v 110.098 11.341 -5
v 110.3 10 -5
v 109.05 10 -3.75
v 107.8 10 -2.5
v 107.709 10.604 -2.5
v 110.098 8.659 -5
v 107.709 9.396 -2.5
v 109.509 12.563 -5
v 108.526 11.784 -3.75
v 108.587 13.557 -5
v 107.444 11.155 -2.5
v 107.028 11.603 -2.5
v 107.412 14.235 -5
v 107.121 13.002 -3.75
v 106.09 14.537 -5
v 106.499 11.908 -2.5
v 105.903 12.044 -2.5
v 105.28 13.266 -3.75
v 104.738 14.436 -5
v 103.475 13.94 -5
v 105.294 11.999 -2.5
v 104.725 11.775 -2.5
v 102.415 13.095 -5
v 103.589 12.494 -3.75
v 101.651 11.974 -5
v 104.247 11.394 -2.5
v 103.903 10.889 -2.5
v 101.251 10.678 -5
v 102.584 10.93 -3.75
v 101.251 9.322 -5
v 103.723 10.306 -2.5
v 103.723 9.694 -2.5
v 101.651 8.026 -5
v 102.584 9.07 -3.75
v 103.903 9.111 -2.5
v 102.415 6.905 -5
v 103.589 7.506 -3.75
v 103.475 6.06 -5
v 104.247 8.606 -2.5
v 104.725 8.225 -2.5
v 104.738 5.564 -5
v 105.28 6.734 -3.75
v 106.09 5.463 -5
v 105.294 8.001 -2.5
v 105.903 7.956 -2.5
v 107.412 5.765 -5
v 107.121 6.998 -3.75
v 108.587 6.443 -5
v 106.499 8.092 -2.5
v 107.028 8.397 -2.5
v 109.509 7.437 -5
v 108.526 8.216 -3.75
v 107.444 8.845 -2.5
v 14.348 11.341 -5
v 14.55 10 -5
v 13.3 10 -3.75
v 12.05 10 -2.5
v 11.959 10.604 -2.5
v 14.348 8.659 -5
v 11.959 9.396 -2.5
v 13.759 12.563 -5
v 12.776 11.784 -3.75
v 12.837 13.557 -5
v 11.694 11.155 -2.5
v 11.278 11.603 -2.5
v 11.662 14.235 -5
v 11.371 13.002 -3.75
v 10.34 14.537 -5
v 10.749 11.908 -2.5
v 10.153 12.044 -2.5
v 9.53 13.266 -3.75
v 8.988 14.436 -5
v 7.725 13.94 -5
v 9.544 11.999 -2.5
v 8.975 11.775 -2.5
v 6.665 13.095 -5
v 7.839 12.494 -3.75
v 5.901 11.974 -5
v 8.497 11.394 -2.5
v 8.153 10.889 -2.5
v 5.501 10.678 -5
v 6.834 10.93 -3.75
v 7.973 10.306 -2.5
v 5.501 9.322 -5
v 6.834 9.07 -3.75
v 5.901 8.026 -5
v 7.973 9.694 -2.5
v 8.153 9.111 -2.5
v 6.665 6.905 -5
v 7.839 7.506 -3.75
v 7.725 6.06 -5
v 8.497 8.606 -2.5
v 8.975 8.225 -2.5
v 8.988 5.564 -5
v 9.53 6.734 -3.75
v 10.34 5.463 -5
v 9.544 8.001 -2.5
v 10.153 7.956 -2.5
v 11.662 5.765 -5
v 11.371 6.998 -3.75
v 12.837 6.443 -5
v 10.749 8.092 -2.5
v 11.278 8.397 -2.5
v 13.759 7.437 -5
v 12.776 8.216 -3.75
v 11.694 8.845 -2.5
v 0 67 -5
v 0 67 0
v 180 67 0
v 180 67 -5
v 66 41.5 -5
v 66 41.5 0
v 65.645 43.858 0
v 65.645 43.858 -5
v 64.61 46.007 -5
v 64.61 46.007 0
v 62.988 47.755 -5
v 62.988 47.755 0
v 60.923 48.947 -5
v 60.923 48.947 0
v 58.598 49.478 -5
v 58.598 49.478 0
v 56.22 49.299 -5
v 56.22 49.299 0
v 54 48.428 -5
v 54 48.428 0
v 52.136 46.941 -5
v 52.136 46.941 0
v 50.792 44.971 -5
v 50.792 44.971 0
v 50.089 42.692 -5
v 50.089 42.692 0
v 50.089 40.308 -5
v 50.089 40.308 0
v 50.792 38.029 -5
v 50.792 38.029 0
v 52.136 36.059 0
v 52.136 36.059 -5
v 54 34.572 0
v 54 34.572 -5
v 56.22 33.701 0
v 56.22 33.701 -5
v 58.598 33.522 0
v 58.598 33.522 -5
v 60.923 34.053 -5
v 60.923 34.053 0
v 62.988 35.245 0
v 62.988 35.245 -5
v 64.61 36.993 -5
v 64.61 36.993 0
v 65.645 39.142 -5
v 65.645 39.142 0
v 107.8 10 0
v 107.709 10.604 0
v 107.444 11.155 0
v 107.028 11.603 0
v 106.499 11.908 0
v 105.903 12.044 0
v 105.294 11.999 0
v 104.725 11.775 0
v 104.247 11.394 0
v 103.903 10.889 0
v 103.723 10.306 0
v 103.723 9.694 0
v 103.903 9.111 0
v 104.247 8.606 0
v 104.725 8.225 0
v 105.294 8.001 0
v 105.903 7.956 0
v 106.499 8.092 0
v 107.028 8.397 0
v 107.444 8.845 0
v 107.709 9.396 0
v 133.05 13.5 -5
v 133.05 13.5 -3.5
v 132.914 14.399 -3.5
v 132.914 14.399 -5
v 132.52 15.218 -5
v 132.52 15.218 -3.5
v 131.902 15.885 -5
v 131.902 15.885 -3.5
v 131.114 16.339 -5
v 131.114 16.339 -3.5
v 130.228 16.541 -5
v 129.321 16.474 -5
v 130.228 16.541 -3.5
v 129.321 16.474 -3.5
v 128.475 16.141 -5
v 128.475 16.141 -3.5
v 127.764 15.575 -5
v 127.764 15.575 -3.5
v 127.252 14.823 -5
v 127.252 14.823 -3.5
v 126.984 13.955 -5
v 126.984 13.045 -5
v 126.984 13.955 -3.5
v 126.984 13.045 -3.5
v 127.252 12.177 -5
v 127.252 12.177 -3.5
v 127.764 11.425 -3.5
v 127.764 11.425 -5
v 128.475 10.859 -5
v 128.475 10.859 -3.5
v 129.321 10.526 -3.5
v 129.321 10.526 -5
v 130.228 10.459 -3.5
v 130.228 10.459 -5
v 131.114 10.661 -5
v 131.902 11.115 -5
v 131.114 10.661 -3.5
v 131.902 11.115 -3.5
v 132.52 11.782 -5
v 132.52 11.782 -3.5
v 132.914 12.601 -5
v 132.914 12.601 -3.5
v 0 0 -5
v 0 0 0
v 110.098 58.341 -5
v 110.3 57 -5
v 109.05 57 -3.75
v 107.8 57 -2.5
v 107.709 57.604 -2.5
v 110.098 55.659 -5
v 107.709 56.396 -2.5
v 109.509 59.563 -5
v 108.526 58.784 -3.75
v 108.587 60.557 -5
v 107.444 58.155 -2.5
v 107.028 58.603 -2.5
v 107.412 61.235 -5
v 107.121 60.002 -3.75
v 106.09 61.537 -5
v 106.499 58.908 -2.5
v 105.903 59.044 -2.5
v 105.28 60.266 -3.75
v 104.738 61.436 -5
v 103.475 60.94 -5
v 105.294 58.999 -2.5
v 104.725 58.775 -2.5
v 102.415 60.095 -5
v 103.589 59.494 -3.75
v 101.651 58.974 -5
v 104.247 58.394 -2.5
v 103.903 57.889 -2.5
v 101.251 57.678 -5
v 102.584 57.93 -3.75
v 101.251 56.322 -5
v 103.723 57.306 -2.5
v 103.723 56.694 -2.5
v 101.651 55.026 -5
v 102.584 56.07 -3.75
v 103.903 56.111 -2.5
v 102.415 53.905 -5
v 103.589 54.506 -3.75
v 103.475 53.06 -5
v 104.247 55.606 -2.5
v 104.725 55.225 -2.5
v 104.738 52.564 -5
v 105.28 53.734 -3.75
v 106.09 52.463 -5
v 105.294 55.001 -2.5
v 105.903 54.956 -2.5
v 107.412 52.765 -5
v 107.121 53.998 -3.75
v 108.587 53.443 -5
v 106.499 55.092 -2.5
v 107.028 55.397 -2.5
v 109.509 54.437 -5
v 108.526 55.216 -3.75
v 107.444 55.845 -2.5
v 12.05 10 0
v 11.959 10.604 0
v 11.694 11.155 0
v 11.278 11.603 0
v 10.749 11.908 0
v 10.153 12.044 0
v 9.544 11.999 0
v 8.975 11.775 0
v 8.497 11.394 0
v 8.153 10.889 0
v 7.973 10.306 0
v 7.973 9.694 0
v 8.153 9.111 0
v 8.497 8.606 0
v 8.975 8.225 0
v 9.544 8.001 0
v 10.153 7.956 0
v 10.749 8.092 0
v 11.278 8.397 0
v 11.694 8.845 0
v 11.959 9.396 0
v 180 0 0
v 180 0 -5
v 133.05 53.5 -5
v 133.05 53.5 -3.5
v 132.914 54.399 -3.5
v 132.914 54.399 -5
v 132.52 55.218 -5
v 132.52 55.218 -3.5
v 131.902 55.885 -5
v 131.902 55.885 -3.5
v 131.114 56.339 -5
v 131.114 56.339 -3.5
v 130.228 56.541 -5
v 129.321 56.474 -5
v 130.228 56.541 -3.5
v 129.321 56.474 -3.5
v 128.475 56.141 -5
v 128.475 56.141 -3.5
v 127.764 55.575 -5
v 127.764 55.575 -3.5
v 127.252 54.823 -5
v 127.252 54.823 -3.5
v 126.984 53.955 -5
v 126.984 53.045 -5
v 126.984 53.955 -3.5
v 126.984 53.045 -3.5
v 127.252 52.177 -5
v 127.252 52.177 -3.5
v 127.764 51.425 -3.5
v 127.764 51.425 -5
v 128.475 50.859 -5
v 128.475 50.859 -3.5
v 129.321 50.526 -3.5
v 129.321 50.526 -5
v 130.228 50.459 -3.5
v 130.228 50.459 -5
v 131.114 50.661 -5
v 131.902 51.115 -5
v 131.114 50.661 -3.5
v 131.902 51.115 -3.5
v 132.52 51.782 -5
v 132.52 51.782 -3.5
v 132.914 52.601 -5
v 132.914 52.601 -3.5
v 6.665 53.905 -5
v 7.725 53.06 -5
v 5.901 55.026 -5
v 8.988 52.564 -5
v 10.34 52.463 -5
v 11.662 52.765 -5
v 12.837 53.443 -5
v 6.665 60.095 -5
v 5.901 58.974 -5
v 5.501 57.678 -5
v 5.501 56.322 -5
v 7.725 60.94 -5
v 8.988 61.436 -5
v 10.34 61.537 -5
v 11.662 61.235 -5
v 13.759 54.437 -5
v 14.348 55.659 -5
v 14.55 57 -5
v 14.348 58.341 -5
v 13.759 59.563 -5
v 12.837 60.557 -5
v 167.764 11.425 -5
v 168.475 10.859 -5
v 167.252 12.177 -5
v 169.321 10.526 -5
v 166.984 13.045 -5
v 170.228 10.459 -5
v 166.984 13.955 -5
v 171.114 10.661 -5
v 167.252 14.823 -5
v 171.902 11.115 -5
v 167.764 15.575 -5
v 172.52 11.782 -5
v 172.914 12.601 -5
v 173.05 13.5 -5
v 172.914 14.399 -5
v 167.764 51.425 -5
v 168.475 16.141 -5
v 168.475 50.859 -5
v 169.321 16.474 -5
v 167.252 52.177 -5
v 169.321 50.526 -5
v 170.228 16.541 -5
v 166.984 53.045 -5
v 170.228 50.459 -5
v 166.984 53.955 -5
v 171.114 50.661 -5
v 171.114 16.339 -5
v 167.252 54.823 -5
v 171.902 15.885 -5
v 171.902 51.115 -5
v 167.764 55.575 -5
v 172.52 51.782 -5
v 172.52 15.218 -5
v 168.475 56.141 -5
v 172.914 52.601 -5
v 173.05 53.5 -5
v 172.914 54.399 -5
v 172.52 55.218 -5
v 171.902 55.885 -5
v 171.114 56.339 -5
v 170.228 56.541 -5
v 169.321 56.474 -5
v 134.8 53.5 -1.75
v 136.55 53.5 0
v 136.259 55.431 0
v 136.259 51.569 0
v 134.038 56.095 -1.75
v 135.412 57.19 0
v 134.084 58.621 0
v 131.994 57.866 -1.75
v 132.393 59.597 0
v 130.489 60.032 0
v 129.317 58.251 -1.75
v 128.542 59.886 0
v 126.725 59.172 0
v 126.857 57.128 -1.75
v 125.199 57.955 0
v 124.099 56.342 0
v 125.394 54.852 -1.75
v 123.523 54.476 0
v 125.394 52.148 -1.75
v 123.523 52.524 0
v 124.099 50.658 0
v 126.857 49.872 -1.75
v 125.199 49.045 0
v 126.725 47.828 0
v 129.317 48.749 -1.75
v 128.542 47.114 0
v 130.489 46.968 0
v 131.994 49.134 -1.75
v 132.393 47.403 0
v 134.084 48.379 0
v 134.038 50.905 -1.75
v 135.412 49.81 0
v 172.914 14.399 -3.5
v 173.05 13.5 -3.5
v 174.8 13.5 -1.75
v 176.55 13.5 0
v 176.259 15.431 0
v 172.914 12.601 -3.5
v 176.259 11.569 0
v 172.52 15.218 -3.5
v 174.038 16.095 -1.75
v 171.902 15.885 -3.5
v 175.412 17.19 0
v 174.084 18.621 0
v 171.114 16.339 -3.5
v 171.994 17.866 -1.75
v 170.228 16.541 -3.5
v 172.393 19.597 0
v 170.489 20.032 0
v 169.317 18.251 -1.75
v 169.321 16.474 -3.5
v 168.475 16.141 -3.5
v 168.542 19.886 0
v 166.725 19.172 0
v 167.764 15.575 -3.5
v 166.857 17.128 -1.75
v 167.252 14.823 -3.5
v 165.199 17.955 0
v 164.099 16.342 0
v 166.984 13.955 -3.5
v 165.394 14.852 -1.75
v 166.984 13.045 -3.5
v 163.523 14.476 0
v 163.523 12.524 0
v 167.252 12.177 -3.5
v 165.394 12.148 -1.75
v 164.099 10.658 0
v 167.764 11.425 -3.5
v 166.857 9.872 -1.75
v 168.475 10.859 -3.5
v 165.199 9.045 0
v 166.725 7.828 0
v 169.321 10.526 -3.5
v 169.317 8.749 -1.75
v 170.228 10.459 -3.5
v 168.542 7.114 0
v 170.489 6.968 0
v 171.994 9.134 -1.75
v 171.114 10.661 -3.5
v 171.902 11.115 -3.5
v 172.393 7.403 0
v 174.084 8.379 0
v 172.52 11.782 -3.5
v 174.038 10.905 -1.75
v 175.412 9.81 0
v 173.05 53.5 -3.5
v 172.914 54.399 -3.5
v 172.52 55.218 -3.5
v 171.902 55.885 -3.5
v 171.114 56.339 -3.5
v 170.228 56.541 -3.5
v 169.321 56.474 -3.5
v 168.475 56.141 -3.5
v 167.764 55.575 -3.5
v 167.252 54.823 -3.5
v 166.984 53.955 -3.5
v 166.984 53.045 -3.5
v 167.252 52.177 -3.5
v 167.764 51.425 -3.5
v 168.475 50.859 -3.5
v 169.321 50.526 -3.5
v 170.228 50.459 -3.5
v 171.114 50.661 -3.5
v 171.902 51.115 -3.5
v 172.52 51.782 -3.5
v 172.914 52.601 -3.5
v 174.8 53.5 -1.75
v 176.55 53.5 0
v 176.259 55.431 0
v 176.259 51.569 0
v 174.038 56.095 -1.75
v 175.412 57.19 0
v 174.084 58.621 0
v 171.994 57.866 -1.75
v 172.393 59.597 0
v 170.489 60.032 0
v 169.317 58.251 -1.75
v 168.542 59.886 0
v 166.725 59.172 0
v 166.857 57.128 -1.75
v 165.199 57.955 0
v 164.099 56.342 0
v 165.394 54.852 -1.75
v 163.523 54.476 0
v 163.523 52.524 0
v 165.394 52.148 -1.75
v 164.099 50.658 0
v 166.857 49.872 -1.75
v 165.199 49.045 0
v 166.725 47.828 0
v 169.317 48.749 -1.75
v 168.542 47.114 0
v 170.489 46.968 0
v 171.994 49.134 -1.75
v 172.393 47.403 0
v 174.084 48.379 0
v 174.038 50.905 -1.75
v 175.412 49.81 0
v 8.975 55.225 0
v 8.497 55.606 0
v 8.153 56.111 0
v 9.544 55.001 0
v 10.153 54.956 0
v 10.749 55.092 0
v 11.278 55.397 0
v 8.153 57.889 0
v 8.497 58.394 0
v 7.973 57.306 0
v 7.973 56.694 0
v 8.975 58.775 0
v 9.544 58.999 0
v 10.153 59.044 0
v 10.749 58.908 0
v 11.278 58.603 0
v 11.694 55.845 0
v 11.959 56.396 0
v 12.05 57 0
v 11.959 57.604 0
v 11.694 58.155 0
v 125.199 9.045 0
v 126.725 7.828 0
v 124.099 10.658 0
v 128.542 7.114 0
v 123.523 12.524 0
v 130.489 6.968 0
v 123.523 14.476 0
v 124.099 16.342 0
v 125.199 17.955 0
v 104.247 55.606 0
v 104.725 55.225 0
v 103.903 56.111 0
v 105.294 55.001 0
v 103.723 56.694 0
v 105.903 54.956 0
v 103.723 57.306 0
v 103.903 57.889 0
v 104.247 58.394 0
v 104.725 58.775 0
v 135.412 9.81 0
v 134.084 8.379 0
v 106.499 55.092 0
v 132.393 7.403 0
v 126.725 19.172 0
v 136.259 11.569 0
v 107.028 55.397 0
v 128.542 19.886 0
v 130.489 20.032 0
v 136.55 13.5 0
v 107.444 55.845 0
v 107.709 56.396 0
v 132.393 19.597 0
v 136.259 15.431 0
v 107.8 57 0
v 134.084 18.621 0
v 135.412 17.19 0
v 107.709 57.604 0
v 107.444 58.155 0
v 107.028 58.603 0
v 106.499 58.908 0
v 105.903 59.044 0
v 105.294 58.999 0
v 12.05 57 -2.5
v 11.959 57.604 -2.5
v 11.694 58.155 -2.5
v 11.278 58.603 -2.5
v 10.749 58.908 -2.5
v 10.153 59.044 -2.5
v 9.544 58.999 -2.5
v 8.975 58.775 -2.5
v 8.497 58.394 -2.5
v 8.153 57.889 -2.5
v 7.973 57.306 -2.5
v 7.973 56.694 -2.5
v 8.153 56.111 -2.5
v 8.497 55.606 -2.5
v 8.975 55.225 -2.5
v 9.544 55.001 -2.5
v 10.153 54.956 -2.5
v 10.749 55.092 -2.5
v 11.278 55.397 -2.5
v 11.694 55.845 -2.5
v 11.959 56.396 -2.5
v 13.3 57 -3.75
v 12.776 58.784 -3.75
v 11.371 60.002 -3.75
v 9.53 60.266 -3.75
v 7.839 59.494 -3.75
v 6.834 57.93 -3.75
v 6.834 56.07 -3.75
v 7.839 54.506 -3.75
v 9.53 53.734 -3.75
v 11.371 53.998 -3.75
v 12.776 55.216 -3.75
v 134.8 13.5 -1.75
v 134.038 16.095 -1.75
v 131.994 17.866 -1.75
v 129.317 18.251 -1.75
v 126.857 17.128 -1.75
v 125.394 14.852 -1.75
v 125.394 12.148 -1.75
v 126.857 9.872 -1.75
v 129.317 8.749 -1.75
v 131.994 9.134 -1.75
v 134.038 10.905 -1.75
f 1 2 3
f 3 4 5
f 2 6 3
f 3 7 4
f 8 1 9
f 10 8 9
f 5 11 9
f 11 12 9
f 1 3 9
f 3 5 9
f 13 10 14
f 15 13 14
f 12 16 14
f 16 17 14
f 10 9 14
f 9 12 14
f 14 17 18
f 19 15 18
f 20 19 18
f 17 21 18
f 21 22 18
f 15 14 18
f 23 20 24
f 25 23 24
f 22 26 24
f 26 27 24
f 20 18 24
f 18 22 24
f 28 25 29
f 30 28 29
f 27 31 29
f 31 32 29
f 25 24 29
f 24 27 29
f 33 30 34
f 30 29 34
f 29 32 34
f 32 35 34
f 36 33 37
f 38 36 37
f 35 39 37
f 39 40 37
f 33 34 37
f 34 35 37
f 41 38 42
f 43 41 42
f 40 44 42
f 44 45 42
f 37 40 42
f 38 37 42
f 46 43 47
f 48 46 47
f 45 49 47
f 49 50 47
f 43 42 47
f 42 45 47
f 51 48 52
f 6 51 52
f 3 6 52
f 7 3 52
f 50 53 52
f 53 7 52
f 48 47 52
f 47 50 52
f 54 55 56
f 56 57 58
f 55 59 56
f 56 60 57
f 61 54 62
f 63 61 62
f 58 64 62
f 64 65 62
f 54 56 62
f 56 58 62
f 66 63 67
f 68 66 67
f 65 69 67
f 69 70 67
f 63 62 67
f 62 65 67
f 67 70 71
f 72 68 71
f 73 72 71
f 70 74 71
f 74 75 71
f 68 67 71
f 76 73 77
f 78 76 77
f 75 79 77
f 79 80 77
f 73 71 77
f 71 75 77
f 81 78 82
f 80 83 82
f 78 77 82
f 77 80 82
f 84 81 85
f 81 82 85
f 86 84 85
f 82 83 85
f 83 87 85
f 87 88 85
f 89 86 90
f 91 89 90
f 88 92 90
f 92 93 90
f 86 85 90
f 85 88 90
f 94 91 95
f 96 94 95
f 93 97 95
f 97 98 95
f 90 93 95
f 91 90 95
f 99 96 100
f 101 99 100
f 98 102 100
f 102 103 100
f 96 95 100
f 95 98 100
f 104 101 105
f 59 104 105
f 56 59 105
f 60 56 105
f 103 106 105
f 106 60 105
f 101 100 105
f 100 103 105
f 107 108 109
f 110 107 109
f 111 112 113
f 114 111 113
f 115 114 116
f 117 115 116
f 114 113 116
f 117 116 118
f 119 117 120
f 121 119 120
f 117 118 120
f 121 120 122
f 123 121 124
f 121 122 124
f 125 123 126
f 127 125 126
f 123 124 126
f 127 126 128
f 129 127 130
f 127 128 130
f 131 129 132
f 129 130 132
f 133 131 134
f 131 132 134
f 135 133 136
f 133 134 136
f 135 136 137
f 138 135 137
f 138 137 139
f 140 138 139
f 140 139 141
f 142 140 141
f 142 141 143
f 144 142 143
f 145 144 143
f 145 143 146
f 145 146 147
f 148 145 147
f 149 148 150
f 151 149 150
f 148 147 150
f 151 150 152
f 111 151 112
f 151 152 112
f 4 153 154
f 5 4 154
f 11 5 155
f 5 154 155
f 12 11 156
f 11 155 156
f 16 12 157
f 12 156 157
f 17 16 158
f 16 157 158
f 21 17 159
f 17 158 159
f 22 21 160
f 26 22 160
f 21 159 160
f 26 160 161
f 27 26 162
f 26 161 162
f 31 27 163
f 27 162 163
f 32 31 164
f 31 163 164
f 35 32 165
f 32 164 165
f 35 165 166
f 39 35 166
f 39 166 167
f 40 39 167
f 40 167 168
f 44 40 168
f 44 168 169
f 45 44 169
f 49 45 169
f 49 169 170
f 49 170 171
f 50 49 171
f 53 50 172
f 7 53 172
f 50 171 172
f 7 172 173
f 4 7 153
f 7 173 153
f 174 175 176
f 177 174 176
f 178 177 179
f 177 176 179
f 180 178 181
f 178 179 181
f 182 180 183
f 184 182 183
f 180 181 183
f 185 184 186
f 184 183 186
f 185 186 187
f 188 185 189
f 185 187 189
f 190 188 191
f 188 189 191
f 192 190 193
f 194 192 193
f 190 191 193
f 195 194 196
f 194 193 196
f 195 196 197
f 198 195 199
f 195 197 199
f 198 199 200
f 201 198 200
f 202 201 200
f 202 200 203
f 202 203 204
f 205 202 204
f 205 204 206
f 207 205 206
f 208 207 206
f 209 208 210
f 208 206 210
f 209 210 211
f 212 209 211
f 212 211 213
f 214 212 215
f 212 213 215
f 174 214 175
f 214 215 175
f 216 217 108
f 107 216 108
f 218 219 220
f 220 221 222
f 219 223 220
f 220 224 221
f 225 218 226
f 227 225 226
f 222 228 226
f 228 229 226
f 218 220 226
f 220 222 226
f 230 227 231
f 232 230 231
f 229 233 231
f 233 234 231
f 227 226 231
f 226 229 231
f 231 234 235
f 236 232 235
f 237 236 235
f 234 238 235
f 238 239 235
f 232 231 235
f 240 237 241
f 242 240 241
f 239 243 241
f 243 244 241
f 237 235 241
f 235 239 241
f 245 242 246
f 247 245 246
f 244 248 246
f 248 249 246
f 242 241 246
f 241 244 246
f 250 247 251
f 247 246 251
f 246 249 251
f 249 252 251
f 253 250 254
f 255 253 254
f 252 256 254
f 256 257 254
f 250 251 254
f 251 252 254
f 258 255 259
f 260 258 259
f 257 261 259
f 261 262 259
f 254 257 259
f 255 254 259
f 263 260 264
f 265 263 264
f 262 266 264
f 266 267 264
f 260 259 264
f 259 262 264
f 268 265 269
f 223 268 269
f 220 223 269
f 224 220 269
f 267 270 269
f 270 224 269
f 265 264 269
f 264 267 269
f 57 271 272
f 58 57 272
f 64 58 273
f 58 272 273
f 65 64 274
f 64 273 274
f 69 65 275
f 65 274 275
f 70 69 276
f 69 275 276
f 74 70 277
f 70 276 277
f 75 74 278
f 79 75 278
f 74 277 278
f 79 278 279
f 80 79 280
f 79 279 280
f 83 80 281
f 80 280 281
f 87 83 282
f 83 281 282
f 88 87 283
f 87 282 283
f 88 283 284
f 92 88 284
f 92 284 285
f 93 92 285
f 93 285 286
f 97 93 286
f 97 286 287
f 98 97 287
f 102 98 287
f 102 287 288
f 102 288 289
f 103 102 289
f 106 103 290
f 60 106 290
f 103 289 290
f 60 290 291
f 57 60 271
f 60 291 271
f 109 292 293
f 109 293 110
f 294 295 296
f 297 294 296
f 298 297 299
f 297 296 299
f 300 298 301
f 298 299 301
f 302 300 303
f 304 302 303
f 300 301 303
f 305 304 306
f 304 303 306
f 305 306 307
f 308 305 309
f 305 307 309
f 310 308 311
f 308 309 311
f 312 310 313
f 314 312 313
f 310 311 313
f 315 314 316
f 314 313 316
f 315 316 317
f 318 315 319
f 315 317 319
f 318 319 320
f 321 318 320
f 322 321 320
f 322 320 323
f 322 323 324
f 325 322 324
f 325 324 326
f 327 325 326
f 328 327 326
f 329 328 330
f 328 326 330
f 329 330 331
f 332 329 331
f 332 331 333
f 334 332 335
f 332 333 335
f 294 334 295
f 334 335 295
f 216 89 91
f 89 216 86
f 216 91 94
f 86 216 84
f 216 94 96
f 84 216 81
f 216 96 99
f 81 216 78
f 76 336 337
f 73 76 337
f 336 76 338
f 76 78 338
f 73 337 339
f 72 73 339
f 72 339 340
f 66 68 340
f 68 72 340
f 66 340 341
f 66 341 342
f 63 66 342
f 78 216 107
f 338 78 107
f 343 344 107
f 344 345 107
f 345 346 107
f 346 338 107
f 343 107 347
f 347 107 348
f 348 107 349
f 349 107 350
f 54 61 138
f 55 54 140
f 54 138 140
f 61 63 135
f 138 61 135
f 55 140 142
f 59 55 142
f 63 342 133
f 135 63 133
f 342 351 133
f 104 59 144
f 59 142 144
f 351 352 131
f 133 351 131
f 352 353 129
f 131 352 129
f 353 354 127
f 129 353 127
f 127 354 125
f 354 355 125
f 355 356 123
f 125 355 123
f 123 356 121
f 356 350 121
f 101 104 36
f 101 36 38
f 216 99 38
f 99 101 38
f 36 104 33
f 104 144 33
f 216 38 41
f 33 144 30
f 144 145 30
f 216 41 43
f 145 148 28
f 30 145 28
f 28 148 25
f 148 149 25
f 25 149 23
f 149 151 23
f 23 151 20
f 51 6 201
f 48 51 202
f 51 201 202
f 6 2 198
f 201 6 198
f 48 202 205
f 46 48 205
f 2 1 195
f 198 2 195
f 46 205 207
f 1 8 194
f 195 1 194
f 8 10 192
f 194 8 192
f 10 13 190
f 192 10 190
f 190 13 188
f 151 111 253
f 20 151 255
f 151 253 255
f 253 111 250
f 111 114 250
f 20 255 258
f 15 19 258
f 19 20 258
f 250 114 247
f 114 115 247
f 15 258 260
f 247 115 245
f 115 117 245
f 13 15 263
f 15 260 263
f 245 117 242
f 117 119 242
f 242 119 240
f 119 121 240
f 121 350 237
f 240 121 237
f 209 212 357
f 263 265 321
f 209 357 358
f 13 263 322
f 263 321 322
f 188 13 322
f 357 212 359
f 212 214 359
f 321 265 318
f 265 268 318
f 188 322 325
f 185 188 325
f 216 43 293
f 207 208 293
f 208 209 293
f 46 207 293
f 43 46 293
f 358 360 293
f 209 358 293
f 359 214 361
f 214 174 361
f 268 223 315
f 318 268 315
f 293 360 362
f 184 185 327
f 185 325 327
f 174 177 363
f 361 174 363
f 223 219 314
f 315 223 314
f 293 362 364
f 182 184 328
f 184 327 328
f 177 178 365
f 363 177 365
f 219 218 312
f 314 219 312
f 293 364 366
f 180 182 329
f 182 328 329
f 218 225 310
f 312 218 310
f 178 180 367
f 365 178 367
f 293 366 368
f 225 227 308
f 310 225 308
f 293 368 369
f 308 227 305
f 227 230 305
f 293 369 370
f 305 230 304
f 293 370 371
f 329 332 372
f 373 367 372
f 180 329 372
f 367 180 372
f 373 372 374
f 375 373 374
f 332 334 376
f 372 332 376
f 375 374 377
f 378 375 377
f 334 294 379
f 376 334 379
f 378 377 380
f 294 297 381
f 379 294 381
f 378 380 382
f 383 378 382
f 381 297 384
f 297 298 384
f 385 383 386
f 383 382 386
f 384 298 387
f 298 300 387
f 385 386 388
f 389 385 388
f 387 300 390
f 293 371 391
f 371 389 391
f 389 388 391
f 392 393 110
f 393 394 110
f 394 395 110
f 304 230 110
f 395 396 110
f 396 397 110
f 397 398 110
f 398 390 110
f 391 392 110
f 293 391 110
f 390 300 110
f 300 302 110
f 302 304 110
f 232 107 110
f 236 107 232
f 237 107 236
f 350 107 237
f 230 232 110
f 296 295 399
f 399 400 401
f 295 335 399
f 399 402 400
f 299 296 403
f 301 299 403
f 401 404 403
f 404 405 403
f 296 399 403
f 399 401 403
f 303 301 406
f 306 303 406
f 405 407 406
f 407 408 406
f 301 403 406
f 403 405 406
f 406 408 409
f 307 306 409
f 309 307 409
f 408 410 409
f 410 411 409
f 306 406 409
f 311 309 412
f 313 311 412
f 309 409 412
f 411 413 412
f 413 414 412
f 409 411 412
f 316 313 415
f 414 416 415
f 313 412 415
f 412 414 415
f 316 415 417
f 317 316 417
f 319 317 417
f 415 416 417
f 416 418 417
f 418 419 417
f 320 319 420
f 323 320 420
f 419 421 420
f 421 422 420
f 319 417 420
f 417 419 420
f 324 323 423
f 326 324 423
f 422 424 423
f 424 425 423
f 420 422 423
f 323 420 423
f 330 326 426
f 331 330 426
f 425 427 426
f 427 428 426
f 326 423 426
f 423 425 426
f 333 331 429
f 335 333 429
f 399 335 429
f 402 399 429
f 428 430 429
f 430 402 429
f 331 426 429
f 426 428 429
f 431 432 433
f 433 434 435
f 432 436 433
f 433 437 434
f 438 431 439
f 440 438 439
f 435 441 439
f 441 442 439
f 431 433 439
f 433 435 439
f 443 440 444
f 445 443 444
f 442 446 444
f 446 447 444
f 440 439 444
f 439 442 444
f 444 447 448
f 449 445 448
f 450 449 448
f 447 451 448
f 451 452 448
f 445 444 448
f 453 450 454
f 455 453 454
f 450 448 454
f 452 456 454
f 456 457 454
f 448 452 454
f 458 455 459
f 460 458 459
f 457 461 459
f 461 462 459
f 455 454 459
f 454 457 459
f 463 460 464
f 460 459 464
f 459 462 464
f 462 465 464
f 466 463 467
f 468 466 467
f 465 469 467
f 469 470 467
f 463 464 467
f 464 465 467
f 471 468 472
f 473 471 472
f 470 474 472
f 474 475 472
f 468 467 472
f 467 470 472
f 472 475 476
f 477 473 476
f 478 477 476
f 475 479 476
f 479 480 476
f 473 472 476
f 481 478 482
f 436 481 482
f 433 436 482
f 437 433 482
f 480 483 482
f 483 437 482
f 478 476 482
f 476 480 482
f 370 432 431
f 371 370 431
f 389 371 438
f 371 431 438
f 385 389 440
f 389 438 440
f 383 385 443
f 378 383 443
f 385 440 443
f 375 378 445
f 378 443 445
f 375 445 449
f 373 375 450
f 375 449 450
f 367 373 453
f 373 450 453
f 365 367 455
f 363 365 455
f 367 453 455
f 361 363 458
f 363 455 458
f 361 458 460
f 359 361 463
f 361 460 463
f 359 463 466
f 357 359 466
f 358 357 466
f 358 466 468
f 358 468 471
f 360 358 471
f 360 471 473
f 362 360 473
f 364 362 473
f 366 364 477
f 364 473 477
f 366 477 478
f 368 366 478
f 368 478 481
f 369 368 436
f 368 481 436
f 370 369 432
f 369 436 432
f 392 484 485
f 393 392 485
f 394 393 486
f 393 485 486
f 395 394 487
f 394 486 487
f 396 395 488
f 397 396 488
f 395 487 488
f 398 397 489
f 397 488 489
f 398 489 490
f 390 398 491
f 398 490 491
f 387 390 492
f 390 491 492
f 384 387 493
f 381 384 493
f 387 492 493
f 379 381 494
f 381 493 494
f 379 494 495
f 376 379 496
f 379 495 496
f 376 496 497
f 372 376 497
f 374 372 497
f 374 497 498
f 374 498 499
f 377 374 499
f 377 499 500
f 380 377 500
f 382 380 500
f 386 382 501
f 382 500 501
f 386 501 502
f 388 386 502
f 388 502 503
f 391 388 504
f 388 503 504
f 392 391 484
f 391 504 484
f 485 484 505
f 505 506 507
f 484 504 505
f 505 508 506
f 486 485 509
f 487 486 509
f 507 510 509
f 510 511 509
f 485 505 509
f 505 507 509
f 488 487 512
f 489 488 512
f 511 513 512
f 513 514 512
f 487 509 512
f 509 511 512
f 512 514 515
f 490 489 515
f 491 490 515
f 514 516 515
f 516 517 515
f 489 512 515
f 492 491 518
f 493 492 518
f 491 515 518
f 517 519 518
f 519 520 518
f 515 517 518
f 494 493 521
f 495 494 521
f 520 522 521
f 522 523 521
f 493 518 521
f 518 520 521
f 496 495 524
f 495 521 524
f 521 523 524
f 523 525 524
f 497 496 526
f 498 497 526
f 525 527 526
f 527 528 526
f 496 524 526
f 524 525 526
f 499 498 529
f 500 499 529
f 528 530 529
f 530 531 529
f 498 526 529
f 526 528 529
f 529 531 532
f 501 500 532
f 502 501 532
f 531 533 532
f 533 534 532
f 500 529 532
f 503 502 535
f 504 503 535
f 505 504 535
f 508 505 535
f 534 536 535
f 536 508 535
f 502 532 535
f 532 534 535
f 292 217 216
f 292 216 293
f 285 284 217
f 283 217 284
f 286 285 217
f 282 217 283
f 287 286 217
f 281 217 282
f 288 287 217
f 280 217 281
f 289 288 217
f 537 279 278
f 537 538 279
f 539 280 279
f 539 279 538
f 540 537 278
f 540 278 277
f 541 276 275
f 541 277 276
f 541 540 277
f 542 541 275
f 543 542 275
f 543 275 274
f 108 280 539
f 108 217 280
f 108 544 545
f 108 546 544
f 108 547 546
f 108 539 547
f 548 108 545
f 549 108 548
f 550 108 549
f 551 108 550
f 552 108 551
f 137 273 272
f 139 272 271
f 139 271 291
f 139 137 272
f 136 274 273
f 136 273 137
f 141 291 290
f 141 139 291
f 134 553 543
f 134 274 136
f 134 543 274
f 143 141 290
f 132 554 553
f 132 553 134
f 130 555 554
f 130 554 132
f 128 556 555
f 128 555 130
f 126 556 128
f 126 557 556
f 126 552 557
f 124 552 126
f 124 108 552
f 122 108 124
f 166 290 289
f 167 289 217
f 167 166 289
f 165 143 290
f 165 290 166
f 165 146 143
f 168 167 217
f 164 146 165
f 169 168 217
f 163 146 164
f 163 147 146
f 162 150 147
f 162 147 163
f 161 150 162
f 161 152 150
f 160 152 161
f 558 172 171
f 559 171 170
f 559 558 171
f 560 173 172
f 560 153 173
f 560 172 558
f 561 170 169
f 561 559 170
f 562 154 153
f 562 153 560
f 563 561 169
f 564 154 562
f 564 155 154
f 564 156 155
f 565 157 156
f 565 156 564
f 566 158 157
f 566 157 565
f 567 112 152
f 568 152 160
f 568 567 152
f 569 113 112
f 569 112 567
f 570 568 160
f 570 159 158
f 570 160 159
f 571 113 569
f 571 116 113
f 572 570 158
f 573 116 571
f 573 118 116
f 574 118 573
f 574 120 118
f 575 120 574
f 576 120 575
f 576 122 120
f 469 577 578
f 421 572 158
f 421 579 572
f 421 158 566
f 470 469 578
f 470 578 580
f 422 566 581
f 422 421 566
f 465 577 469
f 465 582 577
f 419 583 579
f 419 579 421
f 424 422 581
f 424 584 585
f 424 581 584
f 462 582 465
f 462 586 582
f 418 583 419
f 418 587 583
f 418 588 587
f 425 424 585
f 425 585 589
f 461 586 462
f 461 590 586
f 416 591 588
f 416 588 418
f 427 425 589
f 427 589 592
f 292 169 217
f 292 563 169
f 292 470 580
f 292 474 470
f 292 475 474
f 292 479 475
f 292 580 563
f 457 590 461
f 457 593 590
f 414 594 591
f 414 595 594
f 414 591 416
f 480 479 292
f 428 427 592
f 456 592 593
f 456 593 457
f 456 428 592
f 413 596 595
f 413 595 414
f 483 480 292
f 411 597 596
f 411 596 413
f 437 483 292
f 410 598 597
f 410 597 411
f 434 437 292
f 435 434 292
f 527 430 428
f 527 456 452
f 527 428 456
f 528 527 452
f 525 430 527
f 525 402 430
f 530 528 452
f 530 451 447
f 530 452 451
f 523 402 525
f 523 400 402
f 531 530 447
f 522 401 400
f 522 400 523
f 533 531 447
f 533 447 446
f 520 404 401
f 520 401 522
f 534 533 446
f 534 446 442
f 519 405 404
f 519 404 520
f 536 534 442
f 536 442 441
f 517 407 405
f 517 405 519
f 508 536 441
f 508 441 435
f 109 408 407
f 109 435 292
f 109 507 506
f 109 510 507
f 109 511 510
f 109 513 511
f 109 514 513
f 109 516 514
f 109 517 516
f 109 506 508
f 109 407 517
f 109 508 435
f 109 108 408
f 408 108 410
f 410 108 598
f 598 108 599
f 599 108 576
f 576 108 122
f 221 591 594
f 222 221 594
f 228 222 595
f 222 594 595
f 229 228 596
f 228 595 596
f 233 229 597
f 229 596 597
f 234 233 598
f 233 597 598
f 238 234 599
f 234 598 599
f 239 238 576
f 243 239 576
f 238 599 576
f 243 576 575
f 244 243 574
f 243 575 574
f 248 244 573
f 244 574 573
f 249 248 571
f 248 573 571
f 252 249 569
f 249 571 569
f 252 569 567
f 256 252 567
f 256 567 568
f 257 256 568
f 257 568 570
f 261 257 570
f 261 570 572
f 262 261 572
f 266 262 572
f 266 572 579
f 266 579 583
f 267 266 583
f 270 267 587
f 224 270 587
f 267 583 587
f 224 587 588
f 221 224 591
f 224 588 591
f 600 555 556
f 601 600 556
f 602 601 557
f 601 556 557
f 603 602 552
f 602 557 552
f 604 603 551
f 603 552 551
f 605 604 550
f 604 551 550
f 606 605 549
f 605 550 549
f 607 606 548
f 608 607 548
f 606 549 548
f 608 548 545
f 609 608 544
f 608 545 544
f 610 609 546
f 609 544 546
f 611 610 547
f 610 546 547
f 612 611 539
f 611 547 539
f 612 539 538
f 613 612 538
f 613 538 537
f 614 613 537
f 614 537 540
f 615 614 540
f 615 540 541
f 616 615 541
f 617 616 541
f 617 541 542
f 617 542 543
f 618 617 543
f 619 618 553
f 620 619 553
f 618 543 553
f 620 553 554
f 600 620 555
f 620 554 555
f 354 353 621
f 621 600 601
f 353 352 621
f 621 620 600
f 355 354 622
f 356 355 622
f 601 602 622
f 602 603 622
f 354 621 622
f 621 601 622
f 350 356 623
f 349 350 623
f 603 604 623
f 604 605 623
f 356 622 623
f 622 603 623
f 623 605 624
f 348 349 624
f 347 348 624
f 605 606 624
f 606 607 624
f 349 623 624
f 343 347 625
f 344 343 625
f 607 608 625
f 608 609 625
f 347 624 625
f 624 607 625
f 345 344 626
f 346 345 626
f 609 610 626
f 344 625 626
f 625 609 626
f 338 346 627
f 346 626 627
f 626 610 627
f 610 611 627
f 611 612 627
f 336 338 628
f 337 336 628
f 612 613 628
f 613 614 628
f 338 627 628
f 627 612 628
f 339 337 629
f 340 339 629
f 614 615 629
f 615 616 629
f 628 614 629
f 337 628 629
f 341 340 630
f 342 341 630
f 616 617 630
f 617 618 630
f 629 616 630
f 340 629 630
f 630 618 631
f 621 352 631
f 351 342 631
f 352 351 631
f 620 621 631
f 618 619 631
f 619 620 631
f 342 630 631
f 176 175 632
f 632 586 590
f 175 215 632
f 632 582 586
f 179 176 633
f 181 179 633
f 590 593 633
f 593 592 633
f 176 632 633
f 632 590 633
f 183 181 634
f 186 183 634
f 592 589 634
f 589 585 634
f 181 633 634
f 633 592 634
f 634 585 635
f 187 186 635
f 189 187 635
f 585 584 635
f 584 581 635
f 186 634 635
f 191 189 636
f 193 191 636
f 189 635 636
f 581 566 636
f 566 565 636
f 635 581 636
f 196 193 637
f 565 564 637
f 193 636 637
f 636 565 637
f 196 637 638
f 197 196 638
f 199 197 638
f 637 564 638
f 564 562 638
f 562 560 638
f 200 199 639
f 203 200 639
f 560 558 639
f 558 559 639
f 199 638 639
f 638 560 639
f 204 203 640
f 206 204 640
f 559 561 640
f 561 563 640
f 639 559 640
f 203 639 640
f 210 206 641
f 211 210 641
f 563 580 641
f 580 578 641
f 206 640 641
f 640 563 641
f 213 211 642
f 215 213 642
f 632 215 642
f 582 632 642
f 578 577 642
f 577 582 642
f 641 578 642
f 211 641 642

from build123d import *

# Parameters (mm, degrees)
F0_W     = 180
F0_H     = 67
F0_R     = 2.05
F0_R_2   = 3.05
F0_R_3   = 8
F1_DEPTH = 5
F2_SIZE  = 3.5
F3_SIZE  = 2.5


with BuildPart() as f1:
    # F0 (on Top) → F1 (new body)
    with BuildSketch(Plane.XY):
        with Locations((90, 33.5)):
            Rectangle(F0_W, F0_H)
        with Locations((10, 10)):
            Circle(F0_R, mode=Mode.SUBTRACT)
        with Locations((105.75, 10)):
            Circle(F0_R, mode=Mode.SUBTRACT)
        with Locations((130, 13.5)):
            Circle(F0_R_2, mode=Mode.SUBTRACT)
        with Locations((170, 13.5)):
            Circle(F0_R_2, mode=Mode.SUBTRACT)
        with Locations((58, 41.5)):
            Circle(F0_R_3, mode=Mode.SUBTRACT)
        with Locations((10, 57)):
            Circle(F0_R, mode=Mode.SUBTRACT)
        with Locations((105.75, 57)):
            Circle(F0_R, mode=Mode.SUBTRACT)
        with Locations((130, 53.5)):
            Circle(F0_R_2, mode=Mode.SUBTRACT)
        with Locations((170, 53.5)):
            Circle(F0_R_2, mode=Mode.SUBTRACT)
    extrude(amount=-F1_DEPTH)

    # F2
    f2_edges = [f1.edges().sort_by_distance(p)[0] for p in [
        (126.95, 53.5, 0),
        (166.95, 53.5, 0),
        (166.95, 13.5, 0),
        (126.95, 13.5, 0),
    ]]
    chamfer(f2_edges, length=F2_SIZE)

    # F3
    f3_edges = [f1.edges().sort_by_distance(p)[0] for p in [
        (103.7, 57, -5),
        (103.7, 10, -5),
        (7.95, 10, -5),
        (7.95, 57, -5),
    ]]
    chamfer(f3_edges, length=F3_SIZE)


solid = f1.part
